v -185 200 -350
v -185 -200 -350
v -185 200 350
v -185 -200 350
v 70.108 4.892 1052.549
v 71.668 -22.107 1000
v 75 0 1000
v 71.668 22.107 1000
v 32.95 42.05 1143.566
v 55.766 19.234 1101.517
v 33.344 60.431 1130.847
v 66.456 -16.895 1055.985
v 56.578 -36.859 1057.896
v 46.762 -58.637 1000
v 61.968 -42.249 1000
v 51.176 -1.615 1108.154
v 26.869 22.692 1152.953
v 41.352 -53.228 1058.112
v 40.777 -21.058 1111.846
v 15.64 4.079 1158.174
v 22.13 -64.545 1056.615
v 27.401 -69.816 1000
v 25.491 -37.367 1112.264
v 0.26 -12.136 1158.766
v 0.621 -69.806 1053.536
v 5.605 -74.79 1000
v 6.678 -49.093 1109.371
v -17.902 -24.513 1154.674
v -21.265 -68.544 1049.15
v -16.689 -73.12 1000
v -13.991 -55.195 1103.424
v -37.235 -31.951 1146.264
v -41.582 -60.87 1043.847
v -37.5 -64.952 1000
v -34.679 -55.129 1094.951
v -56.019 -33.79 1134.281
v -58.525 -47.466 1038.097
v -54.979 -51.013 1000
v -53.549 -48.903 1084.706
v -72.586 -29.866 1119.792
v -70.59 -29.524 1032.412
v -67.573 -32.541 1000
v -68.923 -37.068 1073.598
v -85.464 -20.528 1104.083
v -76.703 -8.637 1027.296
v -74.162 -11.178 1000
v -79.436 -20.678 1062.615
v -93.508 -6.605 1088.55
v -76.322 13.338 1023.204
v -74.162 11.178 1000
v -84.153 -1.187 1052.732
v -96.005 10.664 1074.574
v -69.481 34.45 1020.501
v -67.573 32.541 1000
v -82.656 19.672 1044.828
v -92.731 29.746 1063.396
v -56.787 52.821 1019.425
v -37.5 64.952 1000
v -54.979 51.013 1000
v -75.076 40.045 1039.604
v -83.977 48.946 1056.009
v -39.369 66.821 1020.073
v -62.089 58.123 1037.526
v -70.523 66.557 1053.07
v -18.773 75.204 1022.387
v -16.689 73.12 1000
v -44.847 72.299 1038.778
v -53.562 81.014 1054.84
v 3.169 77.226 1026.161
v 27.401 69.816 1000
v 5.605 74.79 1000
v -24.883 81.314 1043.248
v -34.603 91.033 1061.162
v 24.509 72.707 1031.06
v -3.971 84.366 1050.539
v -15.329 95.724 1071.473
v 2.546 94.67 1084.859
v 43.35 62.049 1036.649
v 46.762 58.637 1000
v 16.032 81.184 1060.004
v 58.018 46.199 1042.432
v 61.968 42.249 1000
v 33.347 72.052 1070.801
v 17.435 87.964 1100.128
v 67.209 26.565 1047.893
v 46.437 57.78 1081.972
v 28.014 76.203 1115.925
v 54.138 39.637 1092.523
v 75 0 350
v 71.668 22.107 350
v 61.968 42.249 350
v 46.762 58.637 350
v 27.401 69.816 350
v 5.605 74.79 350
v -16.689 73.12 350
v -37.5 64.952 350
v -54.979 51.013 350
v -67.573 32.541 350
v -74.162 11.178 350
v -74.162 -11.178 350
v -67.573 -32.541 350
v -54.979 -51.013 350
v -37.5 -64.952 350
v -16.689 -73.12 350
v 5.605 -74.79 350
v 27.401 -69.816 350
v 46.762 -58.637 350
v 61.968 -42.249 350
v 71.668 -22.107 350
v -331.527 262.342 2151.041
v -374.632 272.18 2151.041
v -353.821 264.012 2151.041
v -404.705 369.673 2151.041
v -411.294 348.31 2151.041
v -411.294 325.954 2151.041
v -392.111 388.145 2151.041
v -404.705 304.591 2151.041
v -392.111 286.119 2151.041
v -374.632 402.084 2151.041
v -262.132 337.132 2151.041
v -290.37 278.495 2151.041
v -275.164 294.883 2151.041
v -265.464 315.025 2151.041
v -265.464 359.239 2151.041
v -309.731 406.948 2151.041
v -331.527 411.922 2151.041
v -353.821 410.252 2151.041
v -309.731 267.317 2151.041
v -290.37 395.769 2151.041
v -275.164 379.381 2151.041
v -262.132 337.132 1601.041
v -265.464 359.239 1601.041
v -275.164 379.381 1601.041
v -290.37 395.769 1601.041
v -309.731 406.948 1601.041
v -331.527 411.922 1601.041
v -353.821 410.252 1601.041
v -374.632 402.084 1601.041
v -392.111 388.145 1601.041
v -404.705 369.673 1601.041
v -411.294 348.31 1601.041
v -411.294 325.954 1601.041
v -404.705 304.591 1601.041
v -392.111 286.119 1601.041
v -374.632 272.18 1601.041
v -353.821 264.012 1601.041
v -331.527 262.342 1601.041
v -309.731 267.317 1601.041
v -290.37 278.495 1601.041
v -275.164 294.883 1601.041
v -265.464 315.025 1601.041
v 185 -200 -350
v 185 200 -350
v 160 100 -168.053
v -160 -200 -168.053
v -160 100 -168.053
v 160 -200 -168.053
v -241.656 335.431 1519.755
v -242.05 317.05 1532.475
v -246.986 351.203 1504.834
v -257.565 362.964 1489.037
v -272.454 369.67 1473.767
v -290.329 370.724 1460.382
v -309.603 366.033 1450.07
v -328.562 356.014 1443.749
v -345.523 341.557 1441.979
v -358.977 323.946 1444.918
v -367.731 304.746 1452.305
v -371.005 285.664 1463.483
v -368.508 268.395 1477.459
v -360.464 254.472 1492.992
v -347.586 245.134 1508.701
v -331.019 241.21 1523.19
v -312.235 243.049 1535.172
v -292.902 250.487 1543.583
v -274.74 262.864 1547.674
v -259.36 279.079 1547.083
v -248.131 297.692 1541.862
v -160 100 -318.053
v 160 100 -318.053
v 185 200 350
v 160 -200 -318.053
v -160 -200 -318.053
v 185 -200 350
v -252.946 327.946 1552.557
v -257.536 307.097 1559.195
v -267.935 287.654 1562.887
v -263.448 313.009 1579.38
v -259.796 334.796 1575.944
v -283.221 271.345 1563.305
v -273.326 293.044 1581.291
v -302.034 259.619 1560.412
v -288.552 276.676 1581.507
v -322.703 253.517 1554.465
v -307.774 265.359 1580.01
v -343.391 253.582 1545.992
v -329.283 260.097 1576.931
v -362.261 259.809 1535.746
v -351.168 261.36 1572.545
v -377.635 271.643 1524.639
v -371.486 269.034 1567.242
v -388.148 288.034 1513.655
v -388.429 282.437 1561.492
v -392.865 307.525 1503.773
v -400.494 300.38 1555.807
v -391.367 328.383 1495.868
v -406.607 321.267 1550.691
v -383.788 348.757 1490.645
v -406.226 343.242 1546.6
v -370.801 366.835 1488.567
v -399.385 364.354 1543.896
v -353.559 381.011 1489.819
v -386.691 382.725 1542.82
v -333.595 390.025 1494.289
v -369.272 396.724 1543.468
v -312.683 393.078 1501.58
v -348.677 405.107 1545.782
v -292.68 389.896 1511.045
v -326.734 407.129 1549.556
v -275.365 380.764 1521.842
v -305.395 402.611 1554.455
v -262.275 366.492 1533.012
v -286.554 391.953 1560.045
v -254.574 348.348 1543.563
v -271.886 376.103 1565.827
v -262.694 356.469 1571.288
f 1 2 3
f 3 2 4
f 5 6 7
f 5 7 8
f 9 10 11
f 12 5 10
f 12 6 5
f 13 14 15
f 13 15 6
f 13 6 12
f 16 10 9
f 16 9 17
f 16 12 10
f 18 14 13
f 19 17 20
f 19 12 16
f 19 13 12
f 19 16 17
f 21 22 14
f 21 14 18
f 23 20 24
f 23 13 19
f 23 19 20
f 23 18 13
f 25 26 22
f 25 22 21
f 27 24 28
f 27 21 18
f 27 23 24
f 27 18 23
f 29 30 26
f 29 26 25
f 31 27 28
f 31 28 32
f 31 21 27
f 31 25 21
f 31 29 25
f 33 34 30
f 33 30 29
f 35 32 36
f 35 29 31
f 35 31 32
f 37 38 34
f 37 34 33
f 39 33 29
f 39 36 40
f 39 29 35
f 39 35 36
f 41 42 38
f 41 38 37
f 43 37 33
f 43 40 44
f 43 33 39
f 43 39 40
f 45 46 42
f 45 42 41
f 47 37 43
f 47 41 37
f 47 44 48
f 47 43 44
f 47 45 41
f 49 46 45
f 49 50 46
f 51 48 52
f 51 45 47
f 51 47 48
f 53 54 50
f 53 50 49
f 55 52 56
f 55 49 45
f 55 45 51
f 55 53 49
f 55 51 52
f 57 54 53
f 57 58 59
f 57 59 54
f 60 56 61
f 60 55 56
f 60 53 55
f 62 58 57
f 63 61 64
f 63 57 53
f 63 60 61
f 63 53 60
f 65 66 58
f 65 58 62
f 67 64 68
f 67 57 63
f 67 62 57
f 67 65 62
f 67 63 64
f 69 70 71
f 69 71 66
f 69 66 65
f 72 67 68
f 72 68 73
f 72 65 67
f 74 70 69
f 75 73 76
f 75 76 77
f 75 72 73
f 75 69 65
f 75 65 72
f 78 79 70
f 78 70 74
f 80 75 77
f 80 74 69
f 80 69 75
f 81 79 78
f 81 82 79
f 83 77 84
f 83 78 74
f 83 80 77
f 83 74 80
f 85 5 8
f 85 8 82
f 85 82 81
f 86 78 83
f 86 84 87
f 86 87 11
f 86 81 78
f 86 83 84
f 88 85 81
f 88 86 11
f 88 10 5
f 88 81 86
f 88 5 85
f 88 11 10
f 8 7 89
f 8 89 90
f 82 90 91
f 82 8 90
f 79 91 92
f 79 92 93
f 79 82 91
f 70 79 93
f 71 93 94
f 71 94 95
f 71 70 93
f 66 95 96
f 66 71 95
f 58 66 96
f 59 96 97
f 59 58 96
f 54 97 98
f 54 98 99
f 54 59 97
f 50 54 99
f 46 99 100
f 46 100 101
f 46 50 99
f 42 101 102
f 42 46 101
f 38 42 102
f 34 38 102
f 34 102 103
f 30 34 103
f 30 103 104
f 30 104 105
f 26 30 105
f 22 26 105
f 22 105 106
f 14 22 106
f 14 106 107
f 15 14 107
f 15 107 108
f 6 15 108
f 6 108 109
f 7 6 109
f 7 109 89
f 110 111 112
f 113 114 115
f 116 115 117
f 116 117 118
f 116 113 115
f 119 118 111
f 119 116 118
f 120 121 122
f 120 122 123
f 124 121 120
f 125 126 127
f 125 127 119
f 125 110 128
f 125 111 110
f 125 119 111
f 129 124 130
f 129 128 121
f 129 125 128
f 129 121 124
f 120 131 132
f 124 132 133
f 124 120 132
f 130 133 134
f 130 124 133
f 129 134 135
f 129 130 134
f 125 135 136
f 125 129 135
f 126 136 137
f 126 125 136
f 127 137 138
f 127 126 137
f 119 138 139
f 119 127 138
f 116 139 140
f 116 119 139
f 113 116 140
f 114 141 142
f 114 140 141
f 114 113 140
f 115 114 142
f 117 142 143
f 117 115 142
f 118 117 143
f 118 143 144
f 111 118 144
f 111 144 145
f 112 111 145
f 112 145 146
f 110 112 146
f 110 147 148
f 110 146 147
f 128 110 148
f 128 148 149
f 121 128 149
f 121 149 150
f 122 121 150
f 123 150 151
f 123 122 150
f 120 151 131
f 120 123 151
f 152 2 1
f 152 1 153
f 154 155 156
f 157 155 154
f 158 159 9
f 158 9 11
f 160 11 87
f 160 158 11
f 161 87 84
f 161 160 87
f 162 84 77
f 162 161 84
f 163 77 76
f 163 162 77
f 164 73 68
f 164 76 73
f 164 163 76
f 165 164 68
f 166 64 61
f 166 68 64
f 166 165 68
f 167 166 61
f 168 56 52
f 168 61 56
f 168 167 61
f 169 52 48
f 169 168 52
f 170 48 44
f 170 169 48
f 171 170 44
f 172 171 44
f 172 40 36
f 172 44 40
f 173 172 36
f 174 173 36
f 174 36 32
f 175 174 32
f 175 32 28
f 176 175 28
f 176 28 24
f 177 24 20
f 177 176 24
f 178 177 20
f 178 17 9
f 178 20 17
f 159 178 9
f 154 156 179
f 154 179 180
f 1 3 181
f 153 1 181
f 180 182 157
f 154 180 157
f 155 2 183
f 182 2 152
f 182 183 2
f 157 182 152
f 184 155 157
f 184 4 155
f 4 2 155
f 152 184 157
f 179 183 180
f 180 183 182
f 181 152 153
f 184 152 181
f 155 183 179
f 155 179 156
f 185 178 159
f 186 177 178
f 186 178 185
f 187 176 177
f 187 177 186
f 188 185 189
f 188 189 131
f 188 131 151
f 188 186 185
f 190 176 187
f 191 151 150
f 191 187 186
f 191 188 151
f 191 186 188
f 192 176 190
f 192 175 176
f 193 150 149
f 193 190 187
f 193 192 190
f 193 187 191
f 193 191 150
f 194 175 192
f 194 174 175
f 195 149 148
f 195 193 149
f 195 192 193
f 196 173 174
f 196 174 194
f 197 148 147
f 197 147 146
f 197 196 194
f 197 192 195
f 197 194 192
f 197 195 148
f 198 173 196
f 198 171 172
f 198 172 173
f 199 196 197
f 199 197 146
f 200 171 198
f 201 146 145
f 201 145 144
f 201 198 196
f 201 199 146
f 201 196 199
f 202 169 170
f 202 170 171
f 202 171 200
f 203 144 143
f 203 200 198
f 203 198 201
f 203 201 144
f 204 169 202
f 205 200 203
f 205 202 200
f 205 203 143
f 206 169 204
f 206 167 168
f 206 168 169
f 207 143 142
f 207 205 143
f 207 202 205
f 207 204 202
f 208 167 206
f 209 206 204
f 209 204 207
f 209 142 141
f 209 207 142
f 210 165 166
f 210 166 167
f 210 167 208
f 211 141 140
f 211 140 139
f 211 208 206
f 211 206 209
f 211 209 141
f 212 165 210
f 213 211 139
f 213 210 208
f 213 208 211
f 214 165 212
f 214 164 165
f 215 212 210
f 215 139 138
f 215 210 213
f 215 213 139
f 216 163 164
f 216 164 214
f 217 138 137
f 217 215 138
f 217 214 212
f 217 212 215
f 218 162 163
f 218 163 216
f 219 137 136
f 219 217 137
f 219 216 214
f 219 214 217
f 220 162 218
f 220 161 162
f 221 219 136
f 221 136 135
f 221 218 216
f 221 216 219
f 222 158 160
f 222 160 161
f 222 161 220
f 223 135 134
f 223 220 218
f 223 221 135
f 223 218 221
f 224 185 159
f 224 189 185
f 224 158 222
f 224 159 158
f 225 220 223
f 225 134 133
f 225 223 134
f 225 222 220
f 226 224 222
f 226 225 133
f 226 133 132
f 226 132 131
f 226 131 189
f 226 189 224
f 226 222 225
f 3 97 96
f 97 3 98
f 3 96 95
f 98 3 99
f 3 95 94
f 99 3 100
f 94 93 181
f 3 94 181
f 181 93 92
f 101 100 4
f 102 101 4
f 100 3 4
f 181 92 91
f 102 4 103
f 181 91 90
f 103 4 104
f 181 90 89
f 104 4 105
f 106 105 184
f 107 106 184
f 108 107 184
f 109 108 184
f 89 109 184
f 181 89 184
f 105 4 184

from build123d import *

# Parameters (mm, degrees)
F0_W     = 370
F0_H     = 700
F1_DEPTH = 200
F5_R     = 75
F7_W     = 320
F7_H     = 150
F8_DEPTH = 300


with BuildPart() as f1:
    # F0 (on Front) → F1 (new body, symmetric)
    with BuildSketch(Plane.XZ):
        Rectangle(F0_W, F0_H)
    extrude(amount=F1_DEPTH, both=True)

    # F6: sweep along a path in F4
    with BuildLine(Plane(origin=(0, 0, 0), x_dir=(0.7071067812, -0.7071067812, 0), z_dir=(-0.7071067812, -0.7071067812, 0))) as f6_path:
        Line((0, 350), (0, 1000))
        ThreePointArc((0, 1000), (-11.4180701233, 1057.4025148548), (-43.933982822, 1106.066017178))
        Line((-43.933982822, 1106.066017178), (-432.8427124746, 1494.9747468306))
        ThreePointArc((-432.8427124746, 1494.9747468306), (-465.3586251733, 1543.6382491538), (-476.7766952966, 1601.0407640086))
        Line((-476.7766952966, 1601.0407640086), (-476.7766952966, 2151.0407640086))
    # F5 (on face) → F6 (sweep)
    with BuildSketch(Plane.XY.offset(350)):
        Circle(F5_R)
    sweep(path=f6_path.line)

    # F7 (on face) → F8 (cut)
    with BuildSketch(Plane.XZ.offset(200)):
        with Locations((0, -243.052563668)):
            Rectangle(F7_W, F7_H)
    extrude(amount=-F8_DEPTH, mode=Mode.SUBTRACT)


solid = f1.part
